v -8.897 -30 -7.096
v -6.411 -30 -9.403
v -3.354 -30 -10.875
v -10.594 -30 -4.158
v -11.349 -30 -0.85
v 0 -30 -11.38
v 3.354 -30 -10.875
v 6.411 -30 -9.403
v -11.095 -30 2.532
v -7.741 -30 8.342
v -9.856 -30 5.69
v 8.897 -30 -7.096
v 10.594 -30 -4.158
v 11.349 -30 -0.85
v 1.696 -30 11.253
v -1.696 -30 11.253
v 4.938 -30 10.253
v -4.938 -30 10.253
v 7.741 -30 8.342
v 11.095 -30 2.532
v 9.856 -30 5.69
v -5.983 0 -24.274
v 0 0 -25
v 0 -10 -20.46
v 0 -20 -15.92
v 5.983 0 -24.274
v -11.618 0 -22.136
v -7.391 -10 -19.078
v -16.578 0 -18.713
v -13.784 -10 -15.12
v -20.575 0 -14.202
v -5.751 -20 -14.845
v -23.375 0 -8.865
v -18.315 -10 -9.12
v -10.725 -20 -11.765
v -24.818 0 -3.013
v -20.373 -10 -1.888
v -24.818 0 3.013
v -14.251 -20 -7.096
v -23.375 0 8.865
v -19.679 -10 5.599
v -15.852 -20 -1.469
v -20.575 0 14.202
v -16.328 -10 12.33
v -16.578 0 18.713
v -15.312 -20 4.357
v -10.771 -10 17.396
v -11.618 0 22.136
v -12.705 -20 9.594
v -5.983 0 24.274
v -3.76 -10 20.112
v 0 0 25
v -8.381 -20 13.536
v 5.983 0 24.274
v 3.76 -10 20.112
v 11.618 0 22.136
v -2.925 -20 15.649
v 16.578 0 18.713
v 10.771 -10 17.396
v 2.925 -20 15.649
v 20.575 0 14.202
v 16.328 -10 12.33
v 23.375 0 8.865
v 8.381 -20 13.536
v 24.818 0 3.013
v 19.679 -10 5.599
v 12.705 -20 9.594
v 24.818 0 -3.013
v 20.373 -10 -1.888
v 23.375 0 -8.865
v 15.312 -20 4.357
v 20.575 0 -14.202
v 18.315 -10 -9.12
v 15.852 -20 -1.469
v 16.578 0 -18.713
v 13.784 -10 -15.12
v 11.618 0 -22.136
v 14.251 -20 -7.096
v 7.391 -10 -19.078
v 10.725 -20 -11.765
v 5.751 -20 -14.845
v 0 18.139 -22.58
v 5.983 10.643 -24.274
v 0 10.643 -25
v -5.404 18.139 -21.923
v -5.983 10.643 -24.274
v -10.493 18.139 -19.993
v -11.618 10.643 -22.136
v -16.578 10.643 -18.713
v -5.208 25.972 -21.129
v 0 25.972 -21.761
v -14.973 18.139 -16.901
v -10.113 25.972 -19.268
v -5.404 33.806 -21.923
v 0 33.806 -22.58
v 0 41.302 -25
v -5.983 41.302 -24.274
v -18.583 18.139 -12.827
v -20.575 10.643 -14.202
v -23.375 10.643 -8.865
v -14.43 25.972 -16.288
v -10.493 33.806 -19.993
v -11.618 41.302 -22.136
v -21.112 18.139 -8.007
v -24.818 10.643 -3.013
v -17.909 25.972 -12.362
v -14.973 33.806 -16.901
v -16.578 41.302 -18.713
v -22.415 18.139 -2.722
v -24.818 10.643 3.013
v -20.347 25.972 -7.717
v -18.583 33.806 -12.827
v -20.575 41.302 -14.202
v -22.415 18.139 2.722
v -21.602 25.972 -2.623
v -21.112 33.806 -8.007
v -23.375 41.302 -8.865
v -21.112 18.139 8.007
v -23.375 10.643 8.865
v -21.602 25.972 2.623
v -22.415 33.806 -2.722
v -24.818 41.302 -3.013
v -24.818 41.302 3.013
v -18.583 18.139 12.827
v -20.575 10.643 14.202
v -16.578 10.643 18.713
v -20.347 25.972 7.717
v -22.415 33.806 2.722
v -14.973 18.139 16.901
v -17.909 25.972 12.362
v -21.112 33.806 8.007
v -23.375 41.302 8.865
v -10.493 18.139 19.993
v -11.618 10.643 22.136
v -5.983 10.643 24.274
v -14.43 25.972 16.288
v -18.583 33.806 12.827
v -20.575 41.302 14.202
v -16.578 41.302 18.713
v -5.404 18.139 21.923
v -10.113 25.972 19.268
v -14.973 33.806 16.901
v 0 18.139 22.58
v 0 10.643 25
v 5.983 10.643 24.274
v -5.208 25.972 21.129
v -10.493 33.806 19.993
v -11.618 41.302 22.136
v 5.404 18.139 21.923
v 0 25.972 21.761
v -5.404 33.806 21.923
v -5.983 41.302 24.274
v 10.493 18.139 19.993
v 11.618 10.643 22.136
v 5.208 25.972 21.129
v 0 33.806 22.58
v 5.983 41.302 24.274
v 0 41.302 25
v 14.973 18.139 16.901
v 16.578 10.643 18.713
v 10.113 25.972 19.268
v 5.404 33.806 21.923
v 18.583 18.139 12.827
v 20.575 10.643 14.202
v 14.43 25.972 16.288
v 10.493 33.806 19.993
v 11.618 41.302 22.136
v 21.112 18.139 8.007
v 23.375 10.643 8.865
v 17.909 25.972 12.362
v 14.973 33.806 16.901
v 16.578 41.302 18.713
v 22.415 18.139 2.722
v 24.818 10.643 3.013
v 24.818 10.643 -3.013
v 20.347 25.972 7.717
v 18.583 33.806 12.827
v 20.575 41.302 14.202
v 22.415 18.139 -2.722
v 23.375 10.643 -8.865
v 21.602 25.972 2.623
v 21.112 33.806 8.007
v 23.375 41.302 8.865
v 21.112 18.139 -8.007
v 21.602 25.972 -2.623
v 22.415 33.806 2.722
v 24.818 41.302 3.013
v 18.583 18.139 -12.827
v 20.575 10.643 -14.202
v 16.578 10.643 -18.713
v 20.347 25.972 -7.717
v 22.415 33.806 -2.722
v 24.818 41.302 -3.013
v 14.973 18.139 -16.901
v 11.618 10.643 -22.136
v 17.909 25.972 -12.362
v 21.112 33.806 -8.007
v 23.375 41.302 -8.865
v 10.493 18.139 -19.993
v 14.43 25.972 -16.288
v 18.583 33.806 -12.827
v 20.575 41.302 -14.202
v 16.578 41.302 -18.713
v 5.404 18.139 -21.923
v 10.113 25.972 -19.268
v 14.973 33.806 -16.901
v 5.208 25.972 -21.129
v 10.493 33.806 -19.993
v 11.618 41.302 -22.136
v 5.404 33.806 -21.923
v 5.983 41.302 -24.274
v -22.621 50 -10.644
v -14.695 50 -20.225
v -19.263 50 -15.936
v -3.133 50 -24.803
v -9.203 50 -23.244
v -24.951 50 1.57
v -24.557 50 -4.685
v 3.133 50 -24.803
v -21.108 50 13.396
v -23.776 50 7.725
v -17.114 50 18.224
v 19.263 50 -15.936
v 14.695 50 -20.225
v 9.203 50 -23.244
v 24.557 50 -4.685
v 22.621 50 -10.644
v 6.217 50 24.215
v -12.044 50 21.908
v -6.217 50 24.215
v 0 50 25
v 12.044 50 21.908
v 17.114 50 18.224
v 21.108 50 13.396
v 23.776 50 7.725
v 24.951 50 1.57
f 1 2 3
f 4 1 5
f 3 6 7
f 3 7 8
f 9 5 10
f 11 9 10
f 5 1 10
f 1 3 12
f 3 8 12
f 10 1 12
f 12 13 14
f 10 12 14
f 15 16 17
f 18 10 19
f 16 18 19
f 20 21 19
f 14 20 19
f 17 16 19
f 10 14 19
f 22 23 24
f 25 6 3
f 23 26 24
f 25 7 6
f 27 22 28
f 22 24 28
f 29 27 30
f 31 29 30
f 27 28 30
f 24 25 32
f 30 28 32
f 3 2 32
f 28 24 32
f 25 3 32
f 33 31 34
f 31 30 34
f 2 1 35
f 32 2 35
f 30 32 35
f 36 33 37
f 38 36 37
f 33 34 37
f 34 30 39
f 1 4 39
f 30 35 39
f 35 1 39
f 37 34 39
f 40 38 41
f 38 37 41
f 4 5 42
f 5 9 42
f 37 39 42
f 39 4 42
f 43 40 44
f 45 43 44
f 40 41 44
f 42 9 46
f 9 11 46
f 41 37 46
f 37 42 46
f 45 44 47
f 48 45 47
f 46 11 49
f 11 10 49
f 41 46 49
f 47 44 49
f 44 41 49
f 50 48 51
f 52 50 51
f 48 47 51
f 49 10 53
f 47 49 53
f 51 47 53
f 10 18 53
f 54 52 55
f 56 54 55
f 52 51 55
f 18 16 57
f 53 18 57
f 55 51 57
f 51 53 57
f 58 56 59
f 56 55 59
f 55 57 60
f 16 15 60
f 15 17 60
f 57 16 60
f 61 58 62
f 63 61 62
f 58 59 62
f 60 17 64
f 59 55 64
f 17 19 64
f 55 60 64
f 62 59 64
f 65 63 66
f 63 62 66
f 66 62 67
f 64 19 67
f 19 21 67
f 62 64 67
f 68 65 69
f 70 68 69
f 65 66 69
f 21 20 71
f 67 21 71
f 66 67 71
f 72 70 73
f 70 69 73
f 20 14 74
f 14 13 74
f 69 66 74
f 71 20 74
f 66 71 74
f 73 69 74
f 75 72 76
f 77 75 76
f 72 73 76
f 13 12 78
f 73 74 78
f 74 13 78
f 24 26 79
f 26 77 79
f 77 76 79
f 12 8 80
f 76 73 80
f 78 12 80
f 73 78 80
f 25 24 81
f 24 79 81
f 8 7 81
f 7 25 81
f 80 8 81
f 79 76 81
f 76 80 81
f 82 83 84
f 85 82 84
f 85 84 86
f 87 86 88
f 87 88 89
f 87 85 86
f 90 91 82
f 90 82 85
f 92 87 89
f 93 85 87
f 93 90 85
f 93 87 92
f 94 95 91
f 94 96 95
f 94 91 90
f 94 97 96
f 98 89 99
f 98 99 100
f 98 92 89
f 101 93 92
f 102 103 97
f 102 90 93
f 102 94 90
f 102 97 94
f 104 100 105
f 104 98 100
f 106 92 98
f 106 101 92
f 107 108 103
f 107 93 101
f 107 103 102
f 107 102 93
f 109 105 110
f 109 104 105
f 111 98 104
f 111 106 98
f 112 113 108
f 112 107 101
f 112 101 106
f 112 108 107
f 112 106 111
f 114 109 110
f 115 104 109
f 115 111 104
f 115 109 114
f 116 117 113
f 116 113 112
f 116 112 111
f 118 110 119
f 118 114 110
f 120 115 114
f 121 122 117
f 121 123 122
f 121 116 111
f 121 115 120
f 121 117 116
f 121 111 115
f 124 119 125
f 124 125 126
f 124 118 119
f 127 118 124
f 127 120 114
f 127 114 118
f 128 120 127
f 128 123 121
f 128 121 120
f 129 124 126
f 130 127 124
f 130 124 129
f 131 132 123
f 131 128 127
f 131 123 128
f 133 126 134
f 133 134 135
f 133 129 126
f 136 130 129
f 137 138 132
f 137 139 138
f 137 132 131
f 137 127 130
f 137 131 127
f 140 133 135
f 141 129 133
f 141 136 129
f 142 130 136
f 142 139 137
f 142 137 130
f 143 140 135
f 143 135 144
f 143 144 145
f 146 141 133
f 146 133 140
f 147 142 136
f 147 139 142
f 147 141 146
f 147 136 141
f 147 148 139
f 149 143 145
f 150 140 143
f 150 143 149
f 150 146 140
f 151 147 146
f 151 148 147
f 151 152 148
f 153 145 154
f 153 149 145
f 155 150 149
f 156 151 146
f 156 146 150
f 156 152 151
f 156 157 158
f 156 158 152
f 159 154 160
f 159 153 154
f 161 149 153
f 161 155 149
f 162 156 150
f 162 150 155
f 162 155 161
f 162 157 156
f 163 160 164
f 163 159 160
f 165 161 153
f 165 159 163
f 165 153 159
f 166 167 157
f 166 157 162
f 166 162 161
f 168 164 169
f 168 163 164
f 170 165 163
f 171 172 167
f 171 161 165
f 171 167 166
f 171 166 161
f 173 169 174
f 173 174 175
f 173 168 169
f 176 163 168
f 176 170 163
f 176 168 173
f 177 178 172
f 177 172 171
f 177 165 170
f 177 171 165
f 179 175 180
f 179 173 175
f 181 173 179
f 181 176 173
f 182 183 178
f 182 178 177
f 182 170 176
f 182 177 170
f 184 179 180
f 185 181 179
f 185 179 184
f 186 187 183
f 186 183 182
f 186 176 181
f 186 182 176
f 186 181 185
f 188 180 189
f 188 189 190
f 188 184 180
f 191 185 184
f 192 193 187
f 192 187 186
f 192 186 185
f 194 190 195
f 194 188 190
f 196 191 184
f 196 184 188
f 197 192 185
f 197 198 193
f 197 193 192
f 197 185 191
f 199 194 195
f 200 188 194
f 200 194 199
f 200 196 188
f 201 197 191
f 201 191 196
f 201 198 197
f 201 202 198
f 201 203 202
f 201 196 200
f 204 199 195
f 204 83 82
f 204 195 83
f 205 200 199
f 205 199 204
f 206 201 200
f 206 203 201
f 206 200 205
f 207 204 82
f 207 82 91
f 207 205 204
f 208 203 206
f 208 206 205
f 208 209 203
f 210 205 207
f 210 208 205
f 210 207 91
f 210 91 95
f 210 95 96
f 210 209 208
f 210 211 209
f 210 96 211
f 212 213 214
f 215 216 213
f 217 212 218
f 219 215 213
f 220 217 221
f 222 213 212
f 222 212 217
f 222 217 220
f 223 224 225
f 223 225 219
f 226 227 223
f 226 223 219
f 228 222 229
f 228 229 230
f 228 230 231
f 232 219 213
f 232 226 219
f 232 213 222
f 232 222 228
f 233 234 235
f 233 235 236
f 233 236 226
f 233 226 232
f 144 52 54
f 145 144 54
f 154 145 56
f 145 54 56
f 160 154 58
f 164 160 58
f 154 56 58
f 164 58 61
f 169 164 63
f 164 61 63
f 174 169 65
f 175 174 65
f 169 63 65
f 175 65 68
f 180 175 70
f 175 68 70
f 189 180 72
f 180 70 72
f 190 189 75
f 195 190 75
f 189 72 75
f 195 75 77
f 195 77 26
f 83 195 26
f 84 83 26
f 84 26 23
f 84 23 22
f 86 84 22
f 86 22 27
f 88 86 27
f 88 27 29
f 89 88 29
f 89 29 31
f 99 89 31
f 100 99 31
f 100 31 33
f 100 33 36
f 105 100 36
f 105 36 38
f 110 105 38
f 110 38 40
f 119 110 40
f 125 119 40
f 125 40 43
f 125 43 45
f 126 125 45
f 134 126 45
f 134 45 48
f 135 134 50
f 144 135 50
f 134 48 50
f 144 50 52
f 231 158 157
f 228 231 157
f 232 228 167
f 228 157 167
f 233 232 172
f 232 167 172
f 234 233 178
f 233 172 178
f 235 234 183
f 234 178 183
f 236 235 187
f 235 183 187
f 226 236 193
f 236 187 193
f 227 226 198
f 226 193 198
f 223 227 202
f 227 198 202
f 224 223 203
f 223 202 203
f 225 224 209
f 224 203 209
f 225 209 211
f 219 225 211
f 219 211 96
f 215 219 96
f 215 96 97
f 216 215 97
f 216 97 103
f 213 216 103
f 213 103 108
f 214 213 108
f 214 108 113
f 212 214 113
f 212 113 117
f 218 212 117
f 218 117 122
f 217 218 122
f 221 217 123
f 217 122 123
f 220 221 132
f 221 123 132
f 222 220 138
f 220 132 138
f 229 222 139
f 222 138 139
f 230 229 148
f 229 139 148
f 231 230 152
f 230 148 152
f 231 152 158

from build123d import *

# Parameters (mm, degrees)
BOSS_EXTRUDE1_DEPTH      = 50
BOSS_EXTRUDE1_DEPTH_BACK = 30
SKETCH1_R                = 25


with BuildPart() as part:
    # Sketch1 → Boss-Extrude1 (new, two sides: drawn at the far end of the back side and taken through both)
    with BuildSketch(Plane(origin=(0, 0, 0), x_dir=(1, 0, 0), z_dir=(0, 1, 0)).offset(-BOSS_EXTRUDE1_DEPTH_BACK)):
        with Locations(Location((0, 0, 0), (0, 0, 270))):
            Circle(SKETCH1_R)
    extrude(amount=BOSS_EXTRUDE1_DEPTH + BOSS_EXTRUDE1_DEPTH_BACK)

    # Sketch3 → Cut-Revolve1 (revolve, cut)
    with BuildSketch(Plane.XY, mode=Mode.PRIVATE) as cut_revolve1_sk:
        Polygon((25, 0), (11.380324124, -30), (25, -30), align=None)
    revolve(cut_revolve1_sk.sketch.rotate(Axis((0, -30, 0), (0, 1, 0)), 90), axis=Axis((0, -30, 0), (0, 1, 0)), mode=Mode.SUBTRACT)

    # Sketch4 → Cut-Revolve2 (revolve, cut)
    with BuildSketch(Plane.XY, mode=Mode.PRIVATE) as cut_revolve2_sk:
        with BuildLine():
            Line((25, 41.301516329), (25, 10.643181842))
            ThreePointArc((25, 10.643181842), (21.760985667, 25.972349086), (25, 41.301516329))
        make_face()
    revolve(cut_revolve2_sk.sketch.rotate(Axis((0, -30, 0), (0, 1, 0)), 90), axis=Axis((0, -30, 0), (0, 1, 0)), mode=Mode.SUBTRACT)


solid = part.part
